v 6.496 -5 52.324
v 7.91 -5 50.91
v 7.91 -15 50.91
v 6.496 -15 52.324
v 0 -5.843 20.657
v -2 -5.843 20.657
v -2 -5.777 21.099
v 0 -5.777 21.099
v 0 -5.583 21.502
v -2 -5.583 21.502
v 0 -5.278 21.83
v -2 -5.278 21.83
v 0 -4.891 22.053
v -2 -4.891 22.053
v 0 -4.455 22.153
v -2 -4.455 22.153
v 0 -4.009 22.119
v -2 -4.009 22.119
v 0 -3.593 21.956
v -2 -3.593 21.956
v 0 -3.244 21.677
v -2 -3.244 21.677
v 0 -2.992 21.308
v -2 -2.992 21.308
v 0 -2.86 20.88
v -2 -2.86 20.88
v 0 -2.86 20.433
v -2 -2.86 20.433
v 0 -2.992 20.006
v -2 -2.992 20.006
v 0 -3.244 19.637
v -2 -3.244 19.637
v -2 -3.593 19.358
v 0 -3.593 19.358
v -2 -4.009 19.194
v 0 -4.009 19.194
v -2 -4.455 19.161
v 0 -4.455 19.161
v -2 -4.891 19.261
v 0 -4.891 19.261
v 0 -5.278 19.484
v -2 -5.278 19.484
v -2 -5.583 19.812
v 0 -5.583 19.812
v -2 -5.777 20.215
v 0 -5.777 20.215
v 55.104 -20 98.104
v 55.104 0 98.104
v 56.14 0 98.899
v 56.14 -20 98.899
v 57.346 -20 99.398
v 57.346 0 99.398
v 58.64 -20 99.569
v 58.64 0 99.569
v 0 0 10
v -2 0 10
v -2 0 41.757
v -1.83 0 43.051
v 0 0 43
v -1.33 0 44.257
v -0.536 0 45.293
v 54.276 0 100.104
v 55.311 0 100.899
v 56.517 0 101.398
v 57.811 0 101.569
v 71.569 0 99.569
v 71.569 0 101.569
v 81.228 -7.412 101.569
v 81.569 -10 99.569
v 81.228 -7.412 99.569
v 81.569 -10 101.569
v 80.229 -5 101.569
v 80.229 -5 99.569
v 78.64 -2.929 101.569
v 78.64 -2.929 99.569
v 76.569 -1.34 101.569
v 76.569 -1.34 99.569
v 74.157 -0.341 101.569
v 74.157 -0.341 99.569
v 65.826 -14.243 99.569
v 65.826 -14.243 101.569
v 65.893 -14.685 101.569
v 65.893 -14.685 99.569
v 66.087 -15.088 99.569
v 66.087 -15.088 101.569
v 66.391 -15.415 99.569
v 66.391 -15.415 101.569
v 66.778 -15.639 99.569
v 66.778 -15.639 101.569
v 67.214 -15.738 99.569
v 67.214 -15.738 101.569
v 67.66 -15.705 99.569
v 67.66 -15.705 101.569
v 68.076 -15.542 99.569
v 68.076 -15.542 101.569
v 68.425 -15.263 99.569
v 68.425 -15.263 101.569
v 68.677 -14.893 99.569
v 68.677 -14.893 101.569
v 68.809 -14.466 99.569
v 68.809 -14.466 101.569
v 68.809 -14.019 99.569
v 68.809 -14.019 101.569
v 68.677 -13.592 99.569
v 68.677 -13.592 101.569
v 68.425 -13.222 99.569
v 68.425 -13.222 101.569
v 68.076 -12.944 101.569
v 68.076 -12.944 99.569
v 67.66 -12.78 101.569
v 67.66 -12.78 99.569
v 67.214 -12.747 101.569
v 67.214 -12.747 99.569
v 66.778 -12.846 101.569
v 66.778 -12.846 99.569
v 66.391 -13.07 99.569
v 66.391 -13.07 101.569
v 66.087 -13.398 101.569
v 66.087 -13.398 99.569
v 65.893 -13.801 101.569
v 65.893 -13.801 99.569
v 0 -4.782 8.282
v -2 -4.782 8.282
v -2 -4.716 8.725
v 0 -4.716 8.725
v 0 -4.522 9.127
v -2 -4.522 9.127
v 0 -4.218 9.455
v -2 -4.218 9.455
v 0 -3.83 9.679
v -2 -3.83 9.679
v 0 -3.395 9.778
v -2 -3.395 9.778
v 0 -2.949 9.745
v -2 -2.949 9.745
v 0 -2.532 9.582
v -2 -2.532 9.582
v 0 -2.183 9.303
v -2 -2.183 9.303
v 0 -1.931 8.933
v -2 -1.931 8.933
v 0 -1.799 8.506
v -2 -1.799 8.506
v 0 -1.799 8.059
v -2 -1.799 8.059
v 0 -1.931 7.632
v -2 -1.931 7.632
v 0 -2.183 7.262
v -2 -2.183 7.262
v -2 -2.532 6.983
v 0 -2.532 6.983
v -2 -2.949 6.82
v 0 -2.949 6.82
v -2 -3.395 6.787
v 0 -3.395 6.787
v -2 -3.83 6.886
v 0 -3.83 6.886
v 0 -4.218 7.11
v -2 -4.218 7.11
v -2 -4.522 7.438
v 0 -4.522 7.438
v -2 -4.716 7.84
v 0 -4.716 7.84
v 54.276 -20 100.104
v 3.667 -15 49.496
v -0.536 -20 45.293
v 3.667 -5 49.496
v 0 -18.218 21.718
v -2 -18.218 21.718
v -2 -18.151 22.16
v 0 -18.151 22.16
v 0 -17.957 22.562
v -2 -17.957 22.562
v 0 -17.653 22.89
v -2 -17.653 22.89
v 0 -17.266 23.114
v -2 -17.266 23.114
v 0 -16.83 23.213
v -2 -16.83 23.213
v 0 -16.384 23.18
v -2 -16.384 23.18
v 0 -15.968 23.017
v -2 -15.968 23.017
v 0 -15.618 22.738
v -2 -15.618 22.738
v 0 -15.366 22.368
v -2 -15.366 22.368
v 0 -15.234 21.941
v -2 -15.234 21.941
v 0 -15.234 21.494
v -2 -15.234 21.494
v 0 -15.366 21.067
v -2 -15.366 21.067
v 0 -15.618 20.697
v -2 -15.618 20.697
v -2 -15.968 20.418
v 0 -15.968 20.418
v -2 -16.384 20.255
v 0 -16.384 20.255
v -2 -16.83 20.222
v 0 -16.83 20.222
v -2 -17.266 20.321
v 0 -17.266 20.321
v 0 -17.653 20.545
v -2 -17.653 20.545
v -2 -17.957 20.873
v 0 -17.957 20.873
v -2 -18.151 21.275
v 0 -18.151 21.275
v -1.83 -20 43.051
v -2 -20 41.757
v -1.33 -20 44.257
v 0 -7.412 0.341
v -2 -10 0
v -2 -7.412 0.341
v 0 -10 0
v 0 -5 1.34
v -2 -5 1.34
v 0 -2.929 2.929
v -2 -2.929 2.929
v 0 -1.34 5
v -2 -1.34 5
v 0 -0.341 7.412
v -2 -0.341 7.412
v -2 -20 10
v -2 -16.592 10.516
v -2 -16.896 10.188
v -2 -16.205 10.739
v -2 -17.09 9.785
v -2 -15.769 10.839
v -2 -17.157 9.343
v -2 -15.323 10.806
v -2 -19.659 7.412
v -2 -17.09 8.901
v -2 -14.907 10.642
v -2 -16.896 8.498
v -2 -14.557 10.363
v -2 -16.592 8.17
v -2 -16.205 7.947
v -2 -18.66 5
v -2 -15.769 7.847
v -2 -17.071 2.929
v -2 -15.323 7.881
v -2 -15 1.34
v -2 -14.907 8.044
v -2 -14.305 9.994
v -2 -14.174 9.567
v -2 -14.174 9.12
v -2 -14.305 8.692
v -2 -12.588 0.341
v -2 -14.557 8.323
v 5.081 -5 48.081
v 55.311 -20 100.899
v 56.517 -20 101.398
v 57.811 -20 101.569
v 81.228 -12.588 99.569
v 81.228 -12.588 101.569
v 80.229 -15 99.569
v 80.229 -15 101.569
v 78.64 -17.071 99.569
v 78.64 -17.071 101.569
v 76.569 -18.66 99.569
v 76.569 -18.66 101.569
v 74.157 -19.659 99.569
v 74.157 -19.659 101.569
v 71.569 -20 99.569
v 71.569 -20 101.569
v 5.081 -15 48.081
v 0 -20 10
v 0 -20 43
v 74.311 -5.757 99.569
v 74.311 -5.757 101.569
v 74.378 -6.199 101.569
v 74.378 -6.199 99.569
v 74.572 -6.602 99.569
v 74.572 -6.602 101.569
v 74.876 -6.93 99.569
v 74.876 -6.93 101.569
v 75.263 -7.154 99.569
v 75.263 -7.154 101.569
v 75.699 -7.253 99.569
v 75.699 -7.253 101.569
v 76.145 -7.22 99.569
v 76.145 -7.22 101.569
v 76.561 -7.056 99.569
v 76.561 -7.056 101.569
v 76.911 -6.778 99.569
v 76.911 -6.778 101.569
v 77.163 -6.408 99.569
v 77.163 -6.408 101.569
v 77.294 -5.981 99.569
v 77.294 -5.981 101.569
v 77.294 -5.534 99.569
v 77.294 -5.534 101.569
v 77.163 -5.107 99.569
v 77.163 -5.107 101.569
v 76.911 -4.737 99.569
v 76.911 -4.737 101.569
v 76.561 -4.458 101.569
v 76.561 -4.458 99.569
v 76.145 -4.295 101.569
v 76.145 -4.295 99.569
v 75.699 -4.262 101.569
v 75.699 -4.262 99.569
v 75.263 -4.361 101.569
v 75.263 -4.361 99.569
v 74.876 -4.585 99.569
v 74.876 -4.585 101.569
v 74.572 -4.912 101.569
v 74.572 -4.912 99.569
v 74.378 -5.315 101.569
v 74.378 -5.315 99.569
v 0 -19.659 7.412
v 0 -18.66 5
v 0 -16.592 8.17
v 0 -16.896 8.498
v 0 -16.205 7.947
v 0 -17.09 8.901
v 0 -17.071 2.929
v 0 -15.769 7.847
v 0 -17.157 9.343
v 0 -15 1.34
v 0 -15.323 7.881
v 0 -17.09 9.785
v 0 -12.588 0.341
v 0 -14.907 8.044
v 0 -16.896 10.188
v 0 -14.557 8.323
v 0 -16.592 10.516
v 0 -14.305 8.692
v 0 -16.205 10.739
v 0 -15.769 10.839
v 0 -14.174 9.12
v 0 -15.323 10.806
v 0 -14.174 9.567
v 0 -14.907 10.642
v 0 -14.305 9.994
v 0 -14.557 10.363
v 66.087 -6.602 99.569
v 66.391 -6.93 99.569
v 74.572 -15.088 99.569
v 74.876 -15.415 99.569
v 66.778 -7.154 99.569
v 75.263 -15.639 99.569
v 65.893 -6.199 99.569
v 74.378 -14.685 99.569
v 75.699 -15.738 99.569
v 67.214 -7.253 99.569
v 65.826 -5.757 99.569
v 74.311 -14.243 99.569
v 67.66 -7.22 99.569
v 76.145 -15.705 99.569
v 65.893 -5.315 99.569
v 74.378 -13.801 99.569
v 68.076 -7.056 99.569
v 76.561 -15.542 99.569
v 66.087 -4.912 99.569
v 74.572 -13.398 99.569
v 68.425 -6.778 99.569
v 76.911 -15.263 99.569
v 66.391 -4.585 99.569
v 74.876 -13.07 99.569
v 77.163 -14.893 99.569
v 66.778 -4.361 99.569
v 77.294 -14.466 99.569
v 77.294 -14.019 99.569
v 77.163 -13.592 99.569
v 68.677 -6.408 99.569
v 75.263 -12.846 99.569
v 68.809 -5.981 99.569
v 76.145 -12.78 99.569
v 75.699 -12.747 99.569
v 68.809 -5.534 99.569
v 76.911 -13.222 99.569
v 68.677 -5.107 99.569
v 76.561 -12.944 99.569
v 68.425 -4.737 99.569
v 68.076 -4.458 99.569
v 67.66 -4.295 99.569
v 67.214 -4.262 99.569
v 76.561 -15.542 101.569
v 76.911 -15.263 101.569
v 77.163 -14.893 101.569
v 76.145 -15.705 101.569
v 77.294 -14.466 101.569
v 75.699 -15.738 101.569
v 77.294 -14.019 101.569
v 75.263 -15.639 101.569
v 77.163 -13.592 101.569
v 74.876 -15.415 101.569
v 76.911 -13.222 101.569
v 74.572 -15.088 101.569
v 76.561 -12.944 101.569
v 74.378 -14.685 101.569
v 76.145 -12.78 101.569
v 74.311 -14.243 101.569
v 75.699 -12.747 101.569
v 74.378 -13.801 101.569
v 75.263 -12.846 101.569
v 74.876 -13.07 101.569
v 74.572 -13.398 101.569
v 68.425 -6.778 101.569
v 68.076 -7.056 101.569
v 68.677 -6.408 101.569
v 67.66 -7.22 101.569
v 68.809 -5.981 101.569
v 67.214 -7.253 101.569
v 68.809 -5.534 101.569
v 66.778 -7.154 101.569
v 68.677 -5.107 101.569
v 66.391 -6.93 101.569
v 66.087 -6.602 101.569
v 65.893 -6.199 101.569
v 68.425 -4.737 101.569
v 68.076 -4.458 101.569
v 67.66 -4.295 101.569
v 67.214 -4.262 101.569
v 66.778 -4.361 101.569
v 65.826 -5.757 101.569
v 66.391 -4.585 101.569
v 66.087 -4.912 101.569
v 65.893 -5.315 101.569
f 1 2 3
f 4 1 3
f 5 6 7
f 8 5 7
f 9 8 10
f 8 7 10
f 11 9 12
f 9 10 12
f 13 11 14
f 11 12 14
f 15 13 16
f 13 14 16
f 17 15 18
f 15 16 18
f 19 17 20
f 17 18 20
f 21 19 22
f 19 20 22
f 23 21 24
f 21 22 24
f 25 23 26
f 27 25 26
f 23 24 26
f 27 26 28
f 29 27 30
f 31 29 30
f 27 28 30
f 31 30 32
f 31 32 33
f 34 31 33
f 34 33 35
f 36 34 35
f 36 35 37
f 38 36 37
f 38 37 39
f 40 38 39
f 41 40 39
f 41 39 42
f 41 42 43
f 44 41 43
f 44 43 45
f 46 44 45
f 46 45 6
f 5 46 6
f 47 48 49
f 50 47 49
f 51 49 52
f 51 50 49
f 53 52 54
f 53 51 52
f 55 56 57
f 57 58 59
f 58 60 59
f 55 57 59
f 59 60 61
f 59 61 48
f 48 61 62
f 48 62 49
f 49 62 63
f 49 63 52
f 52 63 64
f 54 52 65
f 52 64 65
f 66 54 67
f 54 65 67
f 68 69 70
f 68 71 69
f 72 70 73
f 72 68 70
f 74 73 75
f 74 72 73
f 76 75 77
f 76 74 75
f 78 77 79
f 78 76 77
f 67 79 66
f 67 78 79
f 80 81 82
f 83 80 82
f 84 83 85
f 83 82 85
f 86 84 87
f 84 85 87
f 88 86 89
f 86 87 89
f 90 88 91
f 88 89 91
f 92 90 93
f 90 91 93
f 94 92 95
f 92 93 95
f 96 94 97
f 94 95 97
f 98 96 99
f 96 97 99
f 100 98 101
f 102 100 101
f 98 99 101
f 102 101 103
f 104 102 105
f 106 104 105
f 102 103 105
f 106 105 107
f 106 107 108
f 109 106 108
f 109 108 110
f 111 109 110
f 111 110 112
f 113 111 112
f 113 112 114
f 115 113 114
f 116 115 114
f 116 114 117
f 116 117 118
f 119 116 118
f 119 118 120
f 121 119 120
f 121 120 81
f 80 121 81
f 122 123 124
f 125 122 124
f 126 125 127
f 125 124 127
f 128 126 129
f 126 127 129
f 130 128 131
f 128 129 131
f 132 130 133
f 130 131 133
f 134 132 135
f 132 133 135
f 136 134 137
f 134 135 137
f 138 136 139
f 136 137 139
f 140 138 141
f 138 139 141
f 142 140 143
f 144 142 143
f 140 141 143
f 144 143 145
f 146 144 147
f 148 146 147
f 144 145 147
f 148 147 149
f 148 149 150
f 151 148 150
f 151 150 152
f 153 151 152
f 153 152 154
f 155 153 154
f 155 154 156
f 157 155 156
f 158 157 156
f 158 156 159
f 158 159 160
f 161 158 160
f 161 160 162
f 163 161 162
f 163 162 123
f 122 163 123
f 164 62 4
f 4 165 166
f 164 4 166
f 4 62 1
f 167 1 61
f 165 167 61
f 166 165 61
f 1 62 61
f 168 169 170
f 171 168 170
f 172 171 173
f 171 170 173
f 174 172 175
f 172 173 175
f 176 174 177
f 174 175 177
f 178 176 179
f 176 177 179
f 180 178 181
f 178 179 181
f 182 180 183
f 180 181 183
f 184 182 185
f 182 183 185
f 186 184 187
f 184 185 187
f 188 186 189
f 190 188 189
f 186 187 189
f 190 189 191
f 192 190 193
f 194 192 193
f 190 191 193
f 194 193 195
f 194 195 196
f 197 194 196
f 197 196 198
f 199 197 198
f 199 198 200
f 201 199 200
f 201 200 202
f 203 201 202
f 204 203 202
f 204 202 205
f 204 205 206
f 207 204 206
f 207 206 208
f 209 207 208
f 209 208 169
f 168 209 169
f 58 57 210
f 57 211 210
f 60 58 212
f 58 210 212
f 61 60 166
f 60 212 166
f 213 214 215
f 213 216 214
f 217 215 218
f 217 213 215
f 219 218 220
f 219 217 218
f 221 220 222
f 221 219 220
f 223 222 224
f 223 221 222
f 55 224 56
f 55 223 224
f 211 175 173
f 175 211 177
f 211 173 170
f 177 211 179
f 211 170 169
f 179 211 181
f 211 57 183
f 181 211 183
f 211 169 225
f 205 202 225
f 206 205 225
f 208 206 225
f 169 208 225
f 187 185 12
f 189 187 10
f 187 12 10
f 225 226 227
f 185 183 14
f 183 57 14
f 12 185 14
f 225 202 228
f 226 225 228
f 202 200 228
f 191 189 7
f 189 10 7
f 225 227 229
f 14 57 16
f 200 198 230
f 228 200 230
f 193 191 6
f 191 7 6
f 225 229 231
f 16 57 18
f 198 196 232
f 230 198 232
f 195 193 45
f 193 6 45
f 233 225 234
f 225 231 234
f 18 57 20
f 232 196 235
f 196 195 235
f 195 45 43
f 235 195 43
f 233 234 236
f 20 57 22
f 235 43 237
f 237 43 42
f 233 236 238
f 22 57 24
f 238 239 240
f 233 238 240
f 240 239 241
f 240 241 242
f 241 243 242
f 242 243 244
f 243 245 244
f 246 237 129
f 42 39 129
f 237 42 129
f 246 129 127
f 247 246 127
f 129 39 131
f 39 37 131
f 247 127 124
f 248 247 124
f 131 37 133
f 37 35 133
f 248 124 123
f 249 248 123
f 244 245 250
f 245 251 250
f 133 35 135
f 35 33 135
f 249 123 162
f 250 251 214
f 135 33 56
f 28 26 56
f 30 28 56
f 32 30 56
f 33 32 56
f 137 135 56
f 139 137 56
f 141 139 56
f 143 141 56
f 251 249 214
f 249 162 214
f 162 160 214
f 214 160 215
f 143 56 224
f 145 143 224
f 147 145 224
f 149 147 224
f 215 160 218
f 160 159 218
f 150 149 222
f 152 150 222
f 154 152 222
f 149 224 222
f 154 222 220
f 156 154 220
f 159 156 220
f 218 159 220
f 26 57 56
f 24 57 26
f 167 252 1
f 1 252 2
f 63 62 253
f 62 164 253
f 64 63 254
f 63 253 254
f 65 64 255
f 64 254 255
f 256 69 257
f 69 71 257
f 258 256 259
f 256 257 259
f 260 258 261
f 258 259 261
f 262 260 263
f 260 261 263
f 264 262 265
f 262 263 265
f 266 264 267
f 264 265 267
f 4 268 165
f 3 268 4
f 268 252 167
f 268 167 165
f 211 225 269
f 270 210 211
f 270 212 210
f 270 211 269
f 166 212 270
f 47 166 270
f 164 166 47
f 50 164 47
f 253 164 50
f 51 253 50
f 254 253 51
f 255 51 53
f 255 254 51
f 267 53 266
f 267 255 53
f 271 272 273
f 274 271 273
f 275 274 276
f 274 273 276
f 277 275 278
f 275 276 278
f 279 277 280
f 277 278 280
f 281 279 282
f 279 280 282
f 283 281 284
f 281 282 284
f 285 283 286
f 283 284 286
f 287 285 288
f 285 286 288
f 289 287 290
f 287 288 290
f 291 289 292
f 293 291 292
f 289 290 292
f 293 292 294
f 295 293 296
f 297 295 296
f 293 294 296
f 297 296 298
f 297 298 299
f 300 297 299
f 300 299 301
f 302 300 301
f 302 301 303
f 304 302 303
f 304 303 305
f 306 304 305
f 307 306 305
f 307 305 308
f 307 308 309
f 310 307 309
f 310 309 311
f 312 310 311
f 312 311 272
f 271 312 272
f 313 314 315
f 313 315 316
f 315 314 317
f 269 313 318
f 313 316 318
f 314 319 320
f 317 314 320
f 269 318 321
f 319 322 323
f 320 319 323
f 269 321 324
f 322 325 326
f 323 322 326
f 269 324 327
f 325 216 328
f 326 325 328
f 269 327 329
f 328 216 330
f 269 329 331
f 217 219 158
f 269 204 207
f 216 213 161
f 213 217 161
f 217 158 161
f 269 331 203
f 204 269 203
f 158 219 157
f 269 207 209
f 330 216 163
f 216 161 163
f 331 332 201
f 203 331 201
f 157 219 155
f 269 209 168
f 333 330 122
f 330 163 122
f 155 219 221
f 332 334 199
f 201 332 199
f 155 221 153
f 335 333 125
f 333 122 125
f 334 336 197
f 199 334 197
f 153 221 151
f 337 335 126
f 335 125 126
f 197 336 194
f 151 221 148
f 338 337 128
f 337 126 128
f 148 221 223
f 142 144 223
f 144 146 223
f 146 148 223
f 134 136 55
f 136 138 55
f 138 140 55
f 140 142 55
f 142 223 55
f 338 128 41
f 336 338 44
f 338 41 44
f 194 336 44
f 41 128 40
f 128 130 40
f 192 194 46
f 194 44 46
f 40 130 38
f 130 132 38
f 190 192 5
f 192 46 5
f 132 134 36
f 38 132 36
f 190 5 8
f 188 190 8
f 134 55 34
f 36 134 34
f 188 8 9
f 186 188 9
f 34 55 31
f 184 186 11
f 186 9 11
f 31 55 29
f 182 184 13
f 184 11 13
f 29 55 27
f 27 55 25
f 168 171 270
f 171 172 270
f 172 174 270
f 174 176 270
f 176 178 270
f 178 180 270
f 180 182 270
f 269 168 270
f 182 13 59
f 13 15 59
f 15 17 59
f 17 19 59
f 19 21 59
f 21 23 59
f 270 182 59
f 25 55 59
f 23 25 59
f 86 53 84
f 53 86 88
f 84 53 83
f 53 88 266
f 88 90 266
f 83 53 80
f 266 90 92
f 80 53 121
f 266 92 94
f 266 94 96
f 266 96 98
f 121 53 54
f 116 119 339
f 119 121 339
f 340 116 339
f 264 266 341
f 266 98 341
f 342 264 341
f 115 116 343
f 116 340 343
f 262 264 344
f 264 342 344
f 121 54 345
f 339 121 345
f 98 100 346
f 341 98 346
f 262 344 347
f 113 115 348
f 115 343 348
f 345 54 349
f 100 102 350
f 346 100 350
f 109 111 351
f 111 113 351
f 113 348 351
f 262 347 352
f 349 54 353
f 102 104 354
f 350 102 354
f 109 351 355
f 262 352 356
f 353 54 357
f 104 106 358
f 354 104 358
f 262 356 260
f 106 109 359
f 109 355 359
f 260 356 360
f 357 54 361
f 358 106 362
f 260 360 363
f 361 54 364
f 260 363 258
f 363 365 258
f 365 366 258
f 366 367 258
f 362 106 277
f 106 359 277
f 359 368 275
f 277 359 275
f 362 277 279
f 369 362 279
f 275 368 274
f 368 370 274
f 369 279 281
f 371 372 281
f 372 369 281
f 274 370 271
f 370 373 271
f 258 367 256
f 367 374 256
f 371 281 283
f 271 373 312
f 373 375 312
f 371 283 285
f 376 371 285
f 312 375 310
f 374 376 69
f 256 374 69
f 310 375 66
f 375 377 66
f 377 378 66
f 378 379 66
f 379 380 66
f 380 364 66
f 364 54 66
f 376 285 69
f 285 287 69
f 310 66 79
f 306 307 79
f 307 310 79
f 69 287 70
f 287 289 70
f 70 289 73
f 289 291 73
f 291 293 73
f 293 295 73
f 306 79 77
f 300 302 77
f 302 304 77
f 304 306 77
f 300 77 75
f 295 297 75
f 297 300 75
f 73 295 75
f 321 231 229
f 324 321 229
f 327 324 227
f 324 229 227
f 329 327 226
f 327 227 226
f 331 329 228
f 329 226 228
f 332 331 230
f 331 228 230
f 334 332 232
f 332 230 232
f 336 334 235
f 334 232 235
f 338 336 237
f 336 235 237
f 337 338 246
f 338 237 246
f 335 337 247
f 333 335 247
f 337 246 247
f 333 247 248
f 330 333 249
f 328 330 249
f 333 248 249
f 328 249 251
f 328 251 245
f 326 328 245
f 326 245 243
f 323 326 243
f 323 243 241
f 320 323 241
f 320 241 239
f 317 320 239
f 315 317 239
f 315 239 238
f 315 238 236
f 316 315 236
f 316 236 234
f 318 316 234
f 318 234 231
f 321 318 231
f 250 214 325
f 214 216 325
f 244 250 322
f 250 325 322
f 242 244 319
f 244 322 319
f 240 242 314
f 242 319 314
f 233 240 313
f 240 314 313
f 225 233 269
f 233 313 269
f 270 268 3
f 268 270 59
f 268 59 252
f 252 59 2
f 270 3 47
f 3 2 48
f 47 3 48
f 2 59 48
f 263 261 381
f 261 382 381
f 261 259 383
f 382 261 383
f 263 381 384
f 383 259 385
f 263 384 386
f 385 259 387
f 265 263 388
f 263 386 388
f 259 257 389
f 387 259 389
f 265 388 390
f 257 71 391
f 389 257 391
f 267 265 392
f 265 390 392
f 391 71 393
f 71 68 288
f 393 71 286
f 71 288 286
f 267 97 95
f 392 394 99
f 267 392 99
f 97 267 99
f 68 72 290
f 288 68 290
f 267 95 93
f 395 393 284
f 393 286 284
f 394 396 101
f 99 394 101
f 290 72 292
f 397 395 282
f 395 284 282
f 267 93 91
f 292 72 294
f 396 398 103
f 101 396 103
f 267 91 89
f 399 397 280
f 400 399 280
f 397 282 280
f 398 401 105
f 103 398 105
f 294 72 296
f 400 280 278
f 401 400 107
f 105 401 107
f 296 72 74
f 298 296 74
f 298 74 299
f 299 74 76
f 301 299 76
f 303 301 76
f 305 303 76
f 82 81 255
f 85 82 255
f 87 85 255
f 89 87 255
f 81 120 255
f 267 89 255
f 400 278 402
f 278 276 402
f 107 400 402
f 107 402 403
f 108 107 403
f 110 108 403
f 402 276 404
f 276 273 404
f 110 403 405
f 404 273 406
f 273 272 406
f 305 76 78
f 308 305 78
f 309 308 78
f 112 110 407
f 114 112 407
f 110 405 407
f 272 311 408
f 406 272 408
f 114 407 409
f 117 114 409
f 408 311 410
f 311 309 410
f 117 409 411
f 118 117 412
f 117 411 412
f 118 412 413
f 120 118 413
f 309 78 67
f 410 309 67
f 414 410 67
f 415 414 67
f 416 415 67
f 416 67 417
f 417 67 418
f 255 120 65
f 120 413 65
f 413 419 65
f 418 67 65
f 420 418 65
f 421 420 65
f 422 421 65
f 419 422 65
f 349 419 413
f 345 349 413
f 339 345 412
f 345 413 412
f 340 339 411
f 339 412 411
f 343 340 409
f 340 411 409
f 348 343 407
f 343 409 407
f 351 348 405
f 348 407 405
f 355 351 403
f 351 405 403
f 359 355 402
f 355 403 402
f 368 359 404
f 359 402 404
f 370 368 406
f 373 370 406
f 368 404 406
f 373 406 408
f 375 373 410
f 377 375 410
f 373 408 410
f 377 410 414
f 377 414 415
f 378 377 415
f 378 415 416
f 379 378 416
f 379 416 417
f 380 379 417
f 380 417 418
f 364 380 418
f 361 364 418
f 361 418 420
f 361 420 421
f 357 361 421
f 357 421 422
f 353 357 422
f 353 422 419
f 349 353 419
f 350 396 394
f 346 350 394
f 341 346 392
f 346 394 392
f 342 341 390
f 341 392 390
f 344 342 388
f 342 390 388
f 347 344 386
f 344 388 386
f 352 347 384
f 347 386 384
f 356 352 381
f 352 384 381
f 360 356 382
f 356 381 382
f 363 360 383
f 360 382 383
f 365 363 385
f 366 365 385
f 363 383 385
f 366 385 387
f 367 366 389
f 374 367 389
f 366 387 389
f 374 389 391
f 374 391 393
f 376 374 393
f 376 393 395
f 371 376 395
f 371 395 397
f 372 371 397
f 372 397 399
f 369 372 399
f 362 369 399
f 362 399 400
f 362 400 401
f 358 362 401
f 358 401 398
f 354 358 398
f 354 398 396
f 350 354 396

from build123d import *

# Parameters (mm, degrees)
F1_DEPTH = 20
F3_R     = 9.99999
F4_D     = 3
F5_R     = 5
F7_D     = 3
F8_W     = 4
F8_H     = 10
F9_DEPTH = 25


# Not quite as in the source:
# - a fillet or chamfer is up to 0.001 mm smaller than in the source, because OpenCascade refuses the exact size


with BuildPart() as f1:
    # F0 (on Front) → F1 (new body)
    with BuildSketch(Plane.XZ):
        Polygon((-2, 0), (0, 0), (0, 43), (56.5685424949, 99.5685424949), (81.5685424949, 99.5685424949), (81.5685424949, 101.5685424949), (55.7401153702, 101.5685424949), (-2, 43.8284271247), align=None)
    extrude(amount=F1_DEPTH)

    # F3 (radius 10 in the source; OpenCascade refuses exactly that, so slightly less here)
    f3_edges = [f1.edges().sort_by_distance(p)[0] for p in [
        (-1, -20, 0),
        (-1, 0, 0),
        (81.568542, 0, 100.568542),
        (81.568542, -20, 100.568542),
    ]]
    fillet(f3_edges, radius=F3_R)

    # F4 (through all)
    with Locations(Plane(origin=(0, 0, 99.5685424949), x_dir=(1, 0, 0), z_dir=(0, 0, -1))):
        with Locations((75.811183182, 14.2426406871), (67.3259018078, 14.2426406871), (67.3259018078, 5.7573593129), (75.811183182, 5.7573593129)):
            Hole(F4_D / 2)

    # F5
    f5_edges = [f1.edges().sort_by_distance(p)[0] for p in [
        (55.740115, -10, 101.568542),
        (56.568542, -10, 99.568542),
        (-2, -10, 43.828427),
    ]]
    fillet(f5_edges, radius=F5_R)

    # F7 (through all)
    with Locations(Plane.YZ):
        with Locations((-4.3431457505, 20.6568542495), (-16.7175144213, 21.7175144213), (-15.6568542495, 9.3431457505), (-3.2824855787, 8.2824855787)):
            Hole(F7_D / 2)

    # F8 (on face) → F9 (cut)
    with BuildSketch(Plane(origin=(-21.5, 0, 21.5), x_dir=(0.7071067812, 0, 0.7071067812), z_dir=(0.7071067812, 0, -0.7071067812))):
        with Locations((39.5918783247, 10)):
            Rectangle(F8_W, F8_H)
    extrude(amount=-F9_DEPTH, mode=Mode.SUBTRACT)


solid = f1.part
